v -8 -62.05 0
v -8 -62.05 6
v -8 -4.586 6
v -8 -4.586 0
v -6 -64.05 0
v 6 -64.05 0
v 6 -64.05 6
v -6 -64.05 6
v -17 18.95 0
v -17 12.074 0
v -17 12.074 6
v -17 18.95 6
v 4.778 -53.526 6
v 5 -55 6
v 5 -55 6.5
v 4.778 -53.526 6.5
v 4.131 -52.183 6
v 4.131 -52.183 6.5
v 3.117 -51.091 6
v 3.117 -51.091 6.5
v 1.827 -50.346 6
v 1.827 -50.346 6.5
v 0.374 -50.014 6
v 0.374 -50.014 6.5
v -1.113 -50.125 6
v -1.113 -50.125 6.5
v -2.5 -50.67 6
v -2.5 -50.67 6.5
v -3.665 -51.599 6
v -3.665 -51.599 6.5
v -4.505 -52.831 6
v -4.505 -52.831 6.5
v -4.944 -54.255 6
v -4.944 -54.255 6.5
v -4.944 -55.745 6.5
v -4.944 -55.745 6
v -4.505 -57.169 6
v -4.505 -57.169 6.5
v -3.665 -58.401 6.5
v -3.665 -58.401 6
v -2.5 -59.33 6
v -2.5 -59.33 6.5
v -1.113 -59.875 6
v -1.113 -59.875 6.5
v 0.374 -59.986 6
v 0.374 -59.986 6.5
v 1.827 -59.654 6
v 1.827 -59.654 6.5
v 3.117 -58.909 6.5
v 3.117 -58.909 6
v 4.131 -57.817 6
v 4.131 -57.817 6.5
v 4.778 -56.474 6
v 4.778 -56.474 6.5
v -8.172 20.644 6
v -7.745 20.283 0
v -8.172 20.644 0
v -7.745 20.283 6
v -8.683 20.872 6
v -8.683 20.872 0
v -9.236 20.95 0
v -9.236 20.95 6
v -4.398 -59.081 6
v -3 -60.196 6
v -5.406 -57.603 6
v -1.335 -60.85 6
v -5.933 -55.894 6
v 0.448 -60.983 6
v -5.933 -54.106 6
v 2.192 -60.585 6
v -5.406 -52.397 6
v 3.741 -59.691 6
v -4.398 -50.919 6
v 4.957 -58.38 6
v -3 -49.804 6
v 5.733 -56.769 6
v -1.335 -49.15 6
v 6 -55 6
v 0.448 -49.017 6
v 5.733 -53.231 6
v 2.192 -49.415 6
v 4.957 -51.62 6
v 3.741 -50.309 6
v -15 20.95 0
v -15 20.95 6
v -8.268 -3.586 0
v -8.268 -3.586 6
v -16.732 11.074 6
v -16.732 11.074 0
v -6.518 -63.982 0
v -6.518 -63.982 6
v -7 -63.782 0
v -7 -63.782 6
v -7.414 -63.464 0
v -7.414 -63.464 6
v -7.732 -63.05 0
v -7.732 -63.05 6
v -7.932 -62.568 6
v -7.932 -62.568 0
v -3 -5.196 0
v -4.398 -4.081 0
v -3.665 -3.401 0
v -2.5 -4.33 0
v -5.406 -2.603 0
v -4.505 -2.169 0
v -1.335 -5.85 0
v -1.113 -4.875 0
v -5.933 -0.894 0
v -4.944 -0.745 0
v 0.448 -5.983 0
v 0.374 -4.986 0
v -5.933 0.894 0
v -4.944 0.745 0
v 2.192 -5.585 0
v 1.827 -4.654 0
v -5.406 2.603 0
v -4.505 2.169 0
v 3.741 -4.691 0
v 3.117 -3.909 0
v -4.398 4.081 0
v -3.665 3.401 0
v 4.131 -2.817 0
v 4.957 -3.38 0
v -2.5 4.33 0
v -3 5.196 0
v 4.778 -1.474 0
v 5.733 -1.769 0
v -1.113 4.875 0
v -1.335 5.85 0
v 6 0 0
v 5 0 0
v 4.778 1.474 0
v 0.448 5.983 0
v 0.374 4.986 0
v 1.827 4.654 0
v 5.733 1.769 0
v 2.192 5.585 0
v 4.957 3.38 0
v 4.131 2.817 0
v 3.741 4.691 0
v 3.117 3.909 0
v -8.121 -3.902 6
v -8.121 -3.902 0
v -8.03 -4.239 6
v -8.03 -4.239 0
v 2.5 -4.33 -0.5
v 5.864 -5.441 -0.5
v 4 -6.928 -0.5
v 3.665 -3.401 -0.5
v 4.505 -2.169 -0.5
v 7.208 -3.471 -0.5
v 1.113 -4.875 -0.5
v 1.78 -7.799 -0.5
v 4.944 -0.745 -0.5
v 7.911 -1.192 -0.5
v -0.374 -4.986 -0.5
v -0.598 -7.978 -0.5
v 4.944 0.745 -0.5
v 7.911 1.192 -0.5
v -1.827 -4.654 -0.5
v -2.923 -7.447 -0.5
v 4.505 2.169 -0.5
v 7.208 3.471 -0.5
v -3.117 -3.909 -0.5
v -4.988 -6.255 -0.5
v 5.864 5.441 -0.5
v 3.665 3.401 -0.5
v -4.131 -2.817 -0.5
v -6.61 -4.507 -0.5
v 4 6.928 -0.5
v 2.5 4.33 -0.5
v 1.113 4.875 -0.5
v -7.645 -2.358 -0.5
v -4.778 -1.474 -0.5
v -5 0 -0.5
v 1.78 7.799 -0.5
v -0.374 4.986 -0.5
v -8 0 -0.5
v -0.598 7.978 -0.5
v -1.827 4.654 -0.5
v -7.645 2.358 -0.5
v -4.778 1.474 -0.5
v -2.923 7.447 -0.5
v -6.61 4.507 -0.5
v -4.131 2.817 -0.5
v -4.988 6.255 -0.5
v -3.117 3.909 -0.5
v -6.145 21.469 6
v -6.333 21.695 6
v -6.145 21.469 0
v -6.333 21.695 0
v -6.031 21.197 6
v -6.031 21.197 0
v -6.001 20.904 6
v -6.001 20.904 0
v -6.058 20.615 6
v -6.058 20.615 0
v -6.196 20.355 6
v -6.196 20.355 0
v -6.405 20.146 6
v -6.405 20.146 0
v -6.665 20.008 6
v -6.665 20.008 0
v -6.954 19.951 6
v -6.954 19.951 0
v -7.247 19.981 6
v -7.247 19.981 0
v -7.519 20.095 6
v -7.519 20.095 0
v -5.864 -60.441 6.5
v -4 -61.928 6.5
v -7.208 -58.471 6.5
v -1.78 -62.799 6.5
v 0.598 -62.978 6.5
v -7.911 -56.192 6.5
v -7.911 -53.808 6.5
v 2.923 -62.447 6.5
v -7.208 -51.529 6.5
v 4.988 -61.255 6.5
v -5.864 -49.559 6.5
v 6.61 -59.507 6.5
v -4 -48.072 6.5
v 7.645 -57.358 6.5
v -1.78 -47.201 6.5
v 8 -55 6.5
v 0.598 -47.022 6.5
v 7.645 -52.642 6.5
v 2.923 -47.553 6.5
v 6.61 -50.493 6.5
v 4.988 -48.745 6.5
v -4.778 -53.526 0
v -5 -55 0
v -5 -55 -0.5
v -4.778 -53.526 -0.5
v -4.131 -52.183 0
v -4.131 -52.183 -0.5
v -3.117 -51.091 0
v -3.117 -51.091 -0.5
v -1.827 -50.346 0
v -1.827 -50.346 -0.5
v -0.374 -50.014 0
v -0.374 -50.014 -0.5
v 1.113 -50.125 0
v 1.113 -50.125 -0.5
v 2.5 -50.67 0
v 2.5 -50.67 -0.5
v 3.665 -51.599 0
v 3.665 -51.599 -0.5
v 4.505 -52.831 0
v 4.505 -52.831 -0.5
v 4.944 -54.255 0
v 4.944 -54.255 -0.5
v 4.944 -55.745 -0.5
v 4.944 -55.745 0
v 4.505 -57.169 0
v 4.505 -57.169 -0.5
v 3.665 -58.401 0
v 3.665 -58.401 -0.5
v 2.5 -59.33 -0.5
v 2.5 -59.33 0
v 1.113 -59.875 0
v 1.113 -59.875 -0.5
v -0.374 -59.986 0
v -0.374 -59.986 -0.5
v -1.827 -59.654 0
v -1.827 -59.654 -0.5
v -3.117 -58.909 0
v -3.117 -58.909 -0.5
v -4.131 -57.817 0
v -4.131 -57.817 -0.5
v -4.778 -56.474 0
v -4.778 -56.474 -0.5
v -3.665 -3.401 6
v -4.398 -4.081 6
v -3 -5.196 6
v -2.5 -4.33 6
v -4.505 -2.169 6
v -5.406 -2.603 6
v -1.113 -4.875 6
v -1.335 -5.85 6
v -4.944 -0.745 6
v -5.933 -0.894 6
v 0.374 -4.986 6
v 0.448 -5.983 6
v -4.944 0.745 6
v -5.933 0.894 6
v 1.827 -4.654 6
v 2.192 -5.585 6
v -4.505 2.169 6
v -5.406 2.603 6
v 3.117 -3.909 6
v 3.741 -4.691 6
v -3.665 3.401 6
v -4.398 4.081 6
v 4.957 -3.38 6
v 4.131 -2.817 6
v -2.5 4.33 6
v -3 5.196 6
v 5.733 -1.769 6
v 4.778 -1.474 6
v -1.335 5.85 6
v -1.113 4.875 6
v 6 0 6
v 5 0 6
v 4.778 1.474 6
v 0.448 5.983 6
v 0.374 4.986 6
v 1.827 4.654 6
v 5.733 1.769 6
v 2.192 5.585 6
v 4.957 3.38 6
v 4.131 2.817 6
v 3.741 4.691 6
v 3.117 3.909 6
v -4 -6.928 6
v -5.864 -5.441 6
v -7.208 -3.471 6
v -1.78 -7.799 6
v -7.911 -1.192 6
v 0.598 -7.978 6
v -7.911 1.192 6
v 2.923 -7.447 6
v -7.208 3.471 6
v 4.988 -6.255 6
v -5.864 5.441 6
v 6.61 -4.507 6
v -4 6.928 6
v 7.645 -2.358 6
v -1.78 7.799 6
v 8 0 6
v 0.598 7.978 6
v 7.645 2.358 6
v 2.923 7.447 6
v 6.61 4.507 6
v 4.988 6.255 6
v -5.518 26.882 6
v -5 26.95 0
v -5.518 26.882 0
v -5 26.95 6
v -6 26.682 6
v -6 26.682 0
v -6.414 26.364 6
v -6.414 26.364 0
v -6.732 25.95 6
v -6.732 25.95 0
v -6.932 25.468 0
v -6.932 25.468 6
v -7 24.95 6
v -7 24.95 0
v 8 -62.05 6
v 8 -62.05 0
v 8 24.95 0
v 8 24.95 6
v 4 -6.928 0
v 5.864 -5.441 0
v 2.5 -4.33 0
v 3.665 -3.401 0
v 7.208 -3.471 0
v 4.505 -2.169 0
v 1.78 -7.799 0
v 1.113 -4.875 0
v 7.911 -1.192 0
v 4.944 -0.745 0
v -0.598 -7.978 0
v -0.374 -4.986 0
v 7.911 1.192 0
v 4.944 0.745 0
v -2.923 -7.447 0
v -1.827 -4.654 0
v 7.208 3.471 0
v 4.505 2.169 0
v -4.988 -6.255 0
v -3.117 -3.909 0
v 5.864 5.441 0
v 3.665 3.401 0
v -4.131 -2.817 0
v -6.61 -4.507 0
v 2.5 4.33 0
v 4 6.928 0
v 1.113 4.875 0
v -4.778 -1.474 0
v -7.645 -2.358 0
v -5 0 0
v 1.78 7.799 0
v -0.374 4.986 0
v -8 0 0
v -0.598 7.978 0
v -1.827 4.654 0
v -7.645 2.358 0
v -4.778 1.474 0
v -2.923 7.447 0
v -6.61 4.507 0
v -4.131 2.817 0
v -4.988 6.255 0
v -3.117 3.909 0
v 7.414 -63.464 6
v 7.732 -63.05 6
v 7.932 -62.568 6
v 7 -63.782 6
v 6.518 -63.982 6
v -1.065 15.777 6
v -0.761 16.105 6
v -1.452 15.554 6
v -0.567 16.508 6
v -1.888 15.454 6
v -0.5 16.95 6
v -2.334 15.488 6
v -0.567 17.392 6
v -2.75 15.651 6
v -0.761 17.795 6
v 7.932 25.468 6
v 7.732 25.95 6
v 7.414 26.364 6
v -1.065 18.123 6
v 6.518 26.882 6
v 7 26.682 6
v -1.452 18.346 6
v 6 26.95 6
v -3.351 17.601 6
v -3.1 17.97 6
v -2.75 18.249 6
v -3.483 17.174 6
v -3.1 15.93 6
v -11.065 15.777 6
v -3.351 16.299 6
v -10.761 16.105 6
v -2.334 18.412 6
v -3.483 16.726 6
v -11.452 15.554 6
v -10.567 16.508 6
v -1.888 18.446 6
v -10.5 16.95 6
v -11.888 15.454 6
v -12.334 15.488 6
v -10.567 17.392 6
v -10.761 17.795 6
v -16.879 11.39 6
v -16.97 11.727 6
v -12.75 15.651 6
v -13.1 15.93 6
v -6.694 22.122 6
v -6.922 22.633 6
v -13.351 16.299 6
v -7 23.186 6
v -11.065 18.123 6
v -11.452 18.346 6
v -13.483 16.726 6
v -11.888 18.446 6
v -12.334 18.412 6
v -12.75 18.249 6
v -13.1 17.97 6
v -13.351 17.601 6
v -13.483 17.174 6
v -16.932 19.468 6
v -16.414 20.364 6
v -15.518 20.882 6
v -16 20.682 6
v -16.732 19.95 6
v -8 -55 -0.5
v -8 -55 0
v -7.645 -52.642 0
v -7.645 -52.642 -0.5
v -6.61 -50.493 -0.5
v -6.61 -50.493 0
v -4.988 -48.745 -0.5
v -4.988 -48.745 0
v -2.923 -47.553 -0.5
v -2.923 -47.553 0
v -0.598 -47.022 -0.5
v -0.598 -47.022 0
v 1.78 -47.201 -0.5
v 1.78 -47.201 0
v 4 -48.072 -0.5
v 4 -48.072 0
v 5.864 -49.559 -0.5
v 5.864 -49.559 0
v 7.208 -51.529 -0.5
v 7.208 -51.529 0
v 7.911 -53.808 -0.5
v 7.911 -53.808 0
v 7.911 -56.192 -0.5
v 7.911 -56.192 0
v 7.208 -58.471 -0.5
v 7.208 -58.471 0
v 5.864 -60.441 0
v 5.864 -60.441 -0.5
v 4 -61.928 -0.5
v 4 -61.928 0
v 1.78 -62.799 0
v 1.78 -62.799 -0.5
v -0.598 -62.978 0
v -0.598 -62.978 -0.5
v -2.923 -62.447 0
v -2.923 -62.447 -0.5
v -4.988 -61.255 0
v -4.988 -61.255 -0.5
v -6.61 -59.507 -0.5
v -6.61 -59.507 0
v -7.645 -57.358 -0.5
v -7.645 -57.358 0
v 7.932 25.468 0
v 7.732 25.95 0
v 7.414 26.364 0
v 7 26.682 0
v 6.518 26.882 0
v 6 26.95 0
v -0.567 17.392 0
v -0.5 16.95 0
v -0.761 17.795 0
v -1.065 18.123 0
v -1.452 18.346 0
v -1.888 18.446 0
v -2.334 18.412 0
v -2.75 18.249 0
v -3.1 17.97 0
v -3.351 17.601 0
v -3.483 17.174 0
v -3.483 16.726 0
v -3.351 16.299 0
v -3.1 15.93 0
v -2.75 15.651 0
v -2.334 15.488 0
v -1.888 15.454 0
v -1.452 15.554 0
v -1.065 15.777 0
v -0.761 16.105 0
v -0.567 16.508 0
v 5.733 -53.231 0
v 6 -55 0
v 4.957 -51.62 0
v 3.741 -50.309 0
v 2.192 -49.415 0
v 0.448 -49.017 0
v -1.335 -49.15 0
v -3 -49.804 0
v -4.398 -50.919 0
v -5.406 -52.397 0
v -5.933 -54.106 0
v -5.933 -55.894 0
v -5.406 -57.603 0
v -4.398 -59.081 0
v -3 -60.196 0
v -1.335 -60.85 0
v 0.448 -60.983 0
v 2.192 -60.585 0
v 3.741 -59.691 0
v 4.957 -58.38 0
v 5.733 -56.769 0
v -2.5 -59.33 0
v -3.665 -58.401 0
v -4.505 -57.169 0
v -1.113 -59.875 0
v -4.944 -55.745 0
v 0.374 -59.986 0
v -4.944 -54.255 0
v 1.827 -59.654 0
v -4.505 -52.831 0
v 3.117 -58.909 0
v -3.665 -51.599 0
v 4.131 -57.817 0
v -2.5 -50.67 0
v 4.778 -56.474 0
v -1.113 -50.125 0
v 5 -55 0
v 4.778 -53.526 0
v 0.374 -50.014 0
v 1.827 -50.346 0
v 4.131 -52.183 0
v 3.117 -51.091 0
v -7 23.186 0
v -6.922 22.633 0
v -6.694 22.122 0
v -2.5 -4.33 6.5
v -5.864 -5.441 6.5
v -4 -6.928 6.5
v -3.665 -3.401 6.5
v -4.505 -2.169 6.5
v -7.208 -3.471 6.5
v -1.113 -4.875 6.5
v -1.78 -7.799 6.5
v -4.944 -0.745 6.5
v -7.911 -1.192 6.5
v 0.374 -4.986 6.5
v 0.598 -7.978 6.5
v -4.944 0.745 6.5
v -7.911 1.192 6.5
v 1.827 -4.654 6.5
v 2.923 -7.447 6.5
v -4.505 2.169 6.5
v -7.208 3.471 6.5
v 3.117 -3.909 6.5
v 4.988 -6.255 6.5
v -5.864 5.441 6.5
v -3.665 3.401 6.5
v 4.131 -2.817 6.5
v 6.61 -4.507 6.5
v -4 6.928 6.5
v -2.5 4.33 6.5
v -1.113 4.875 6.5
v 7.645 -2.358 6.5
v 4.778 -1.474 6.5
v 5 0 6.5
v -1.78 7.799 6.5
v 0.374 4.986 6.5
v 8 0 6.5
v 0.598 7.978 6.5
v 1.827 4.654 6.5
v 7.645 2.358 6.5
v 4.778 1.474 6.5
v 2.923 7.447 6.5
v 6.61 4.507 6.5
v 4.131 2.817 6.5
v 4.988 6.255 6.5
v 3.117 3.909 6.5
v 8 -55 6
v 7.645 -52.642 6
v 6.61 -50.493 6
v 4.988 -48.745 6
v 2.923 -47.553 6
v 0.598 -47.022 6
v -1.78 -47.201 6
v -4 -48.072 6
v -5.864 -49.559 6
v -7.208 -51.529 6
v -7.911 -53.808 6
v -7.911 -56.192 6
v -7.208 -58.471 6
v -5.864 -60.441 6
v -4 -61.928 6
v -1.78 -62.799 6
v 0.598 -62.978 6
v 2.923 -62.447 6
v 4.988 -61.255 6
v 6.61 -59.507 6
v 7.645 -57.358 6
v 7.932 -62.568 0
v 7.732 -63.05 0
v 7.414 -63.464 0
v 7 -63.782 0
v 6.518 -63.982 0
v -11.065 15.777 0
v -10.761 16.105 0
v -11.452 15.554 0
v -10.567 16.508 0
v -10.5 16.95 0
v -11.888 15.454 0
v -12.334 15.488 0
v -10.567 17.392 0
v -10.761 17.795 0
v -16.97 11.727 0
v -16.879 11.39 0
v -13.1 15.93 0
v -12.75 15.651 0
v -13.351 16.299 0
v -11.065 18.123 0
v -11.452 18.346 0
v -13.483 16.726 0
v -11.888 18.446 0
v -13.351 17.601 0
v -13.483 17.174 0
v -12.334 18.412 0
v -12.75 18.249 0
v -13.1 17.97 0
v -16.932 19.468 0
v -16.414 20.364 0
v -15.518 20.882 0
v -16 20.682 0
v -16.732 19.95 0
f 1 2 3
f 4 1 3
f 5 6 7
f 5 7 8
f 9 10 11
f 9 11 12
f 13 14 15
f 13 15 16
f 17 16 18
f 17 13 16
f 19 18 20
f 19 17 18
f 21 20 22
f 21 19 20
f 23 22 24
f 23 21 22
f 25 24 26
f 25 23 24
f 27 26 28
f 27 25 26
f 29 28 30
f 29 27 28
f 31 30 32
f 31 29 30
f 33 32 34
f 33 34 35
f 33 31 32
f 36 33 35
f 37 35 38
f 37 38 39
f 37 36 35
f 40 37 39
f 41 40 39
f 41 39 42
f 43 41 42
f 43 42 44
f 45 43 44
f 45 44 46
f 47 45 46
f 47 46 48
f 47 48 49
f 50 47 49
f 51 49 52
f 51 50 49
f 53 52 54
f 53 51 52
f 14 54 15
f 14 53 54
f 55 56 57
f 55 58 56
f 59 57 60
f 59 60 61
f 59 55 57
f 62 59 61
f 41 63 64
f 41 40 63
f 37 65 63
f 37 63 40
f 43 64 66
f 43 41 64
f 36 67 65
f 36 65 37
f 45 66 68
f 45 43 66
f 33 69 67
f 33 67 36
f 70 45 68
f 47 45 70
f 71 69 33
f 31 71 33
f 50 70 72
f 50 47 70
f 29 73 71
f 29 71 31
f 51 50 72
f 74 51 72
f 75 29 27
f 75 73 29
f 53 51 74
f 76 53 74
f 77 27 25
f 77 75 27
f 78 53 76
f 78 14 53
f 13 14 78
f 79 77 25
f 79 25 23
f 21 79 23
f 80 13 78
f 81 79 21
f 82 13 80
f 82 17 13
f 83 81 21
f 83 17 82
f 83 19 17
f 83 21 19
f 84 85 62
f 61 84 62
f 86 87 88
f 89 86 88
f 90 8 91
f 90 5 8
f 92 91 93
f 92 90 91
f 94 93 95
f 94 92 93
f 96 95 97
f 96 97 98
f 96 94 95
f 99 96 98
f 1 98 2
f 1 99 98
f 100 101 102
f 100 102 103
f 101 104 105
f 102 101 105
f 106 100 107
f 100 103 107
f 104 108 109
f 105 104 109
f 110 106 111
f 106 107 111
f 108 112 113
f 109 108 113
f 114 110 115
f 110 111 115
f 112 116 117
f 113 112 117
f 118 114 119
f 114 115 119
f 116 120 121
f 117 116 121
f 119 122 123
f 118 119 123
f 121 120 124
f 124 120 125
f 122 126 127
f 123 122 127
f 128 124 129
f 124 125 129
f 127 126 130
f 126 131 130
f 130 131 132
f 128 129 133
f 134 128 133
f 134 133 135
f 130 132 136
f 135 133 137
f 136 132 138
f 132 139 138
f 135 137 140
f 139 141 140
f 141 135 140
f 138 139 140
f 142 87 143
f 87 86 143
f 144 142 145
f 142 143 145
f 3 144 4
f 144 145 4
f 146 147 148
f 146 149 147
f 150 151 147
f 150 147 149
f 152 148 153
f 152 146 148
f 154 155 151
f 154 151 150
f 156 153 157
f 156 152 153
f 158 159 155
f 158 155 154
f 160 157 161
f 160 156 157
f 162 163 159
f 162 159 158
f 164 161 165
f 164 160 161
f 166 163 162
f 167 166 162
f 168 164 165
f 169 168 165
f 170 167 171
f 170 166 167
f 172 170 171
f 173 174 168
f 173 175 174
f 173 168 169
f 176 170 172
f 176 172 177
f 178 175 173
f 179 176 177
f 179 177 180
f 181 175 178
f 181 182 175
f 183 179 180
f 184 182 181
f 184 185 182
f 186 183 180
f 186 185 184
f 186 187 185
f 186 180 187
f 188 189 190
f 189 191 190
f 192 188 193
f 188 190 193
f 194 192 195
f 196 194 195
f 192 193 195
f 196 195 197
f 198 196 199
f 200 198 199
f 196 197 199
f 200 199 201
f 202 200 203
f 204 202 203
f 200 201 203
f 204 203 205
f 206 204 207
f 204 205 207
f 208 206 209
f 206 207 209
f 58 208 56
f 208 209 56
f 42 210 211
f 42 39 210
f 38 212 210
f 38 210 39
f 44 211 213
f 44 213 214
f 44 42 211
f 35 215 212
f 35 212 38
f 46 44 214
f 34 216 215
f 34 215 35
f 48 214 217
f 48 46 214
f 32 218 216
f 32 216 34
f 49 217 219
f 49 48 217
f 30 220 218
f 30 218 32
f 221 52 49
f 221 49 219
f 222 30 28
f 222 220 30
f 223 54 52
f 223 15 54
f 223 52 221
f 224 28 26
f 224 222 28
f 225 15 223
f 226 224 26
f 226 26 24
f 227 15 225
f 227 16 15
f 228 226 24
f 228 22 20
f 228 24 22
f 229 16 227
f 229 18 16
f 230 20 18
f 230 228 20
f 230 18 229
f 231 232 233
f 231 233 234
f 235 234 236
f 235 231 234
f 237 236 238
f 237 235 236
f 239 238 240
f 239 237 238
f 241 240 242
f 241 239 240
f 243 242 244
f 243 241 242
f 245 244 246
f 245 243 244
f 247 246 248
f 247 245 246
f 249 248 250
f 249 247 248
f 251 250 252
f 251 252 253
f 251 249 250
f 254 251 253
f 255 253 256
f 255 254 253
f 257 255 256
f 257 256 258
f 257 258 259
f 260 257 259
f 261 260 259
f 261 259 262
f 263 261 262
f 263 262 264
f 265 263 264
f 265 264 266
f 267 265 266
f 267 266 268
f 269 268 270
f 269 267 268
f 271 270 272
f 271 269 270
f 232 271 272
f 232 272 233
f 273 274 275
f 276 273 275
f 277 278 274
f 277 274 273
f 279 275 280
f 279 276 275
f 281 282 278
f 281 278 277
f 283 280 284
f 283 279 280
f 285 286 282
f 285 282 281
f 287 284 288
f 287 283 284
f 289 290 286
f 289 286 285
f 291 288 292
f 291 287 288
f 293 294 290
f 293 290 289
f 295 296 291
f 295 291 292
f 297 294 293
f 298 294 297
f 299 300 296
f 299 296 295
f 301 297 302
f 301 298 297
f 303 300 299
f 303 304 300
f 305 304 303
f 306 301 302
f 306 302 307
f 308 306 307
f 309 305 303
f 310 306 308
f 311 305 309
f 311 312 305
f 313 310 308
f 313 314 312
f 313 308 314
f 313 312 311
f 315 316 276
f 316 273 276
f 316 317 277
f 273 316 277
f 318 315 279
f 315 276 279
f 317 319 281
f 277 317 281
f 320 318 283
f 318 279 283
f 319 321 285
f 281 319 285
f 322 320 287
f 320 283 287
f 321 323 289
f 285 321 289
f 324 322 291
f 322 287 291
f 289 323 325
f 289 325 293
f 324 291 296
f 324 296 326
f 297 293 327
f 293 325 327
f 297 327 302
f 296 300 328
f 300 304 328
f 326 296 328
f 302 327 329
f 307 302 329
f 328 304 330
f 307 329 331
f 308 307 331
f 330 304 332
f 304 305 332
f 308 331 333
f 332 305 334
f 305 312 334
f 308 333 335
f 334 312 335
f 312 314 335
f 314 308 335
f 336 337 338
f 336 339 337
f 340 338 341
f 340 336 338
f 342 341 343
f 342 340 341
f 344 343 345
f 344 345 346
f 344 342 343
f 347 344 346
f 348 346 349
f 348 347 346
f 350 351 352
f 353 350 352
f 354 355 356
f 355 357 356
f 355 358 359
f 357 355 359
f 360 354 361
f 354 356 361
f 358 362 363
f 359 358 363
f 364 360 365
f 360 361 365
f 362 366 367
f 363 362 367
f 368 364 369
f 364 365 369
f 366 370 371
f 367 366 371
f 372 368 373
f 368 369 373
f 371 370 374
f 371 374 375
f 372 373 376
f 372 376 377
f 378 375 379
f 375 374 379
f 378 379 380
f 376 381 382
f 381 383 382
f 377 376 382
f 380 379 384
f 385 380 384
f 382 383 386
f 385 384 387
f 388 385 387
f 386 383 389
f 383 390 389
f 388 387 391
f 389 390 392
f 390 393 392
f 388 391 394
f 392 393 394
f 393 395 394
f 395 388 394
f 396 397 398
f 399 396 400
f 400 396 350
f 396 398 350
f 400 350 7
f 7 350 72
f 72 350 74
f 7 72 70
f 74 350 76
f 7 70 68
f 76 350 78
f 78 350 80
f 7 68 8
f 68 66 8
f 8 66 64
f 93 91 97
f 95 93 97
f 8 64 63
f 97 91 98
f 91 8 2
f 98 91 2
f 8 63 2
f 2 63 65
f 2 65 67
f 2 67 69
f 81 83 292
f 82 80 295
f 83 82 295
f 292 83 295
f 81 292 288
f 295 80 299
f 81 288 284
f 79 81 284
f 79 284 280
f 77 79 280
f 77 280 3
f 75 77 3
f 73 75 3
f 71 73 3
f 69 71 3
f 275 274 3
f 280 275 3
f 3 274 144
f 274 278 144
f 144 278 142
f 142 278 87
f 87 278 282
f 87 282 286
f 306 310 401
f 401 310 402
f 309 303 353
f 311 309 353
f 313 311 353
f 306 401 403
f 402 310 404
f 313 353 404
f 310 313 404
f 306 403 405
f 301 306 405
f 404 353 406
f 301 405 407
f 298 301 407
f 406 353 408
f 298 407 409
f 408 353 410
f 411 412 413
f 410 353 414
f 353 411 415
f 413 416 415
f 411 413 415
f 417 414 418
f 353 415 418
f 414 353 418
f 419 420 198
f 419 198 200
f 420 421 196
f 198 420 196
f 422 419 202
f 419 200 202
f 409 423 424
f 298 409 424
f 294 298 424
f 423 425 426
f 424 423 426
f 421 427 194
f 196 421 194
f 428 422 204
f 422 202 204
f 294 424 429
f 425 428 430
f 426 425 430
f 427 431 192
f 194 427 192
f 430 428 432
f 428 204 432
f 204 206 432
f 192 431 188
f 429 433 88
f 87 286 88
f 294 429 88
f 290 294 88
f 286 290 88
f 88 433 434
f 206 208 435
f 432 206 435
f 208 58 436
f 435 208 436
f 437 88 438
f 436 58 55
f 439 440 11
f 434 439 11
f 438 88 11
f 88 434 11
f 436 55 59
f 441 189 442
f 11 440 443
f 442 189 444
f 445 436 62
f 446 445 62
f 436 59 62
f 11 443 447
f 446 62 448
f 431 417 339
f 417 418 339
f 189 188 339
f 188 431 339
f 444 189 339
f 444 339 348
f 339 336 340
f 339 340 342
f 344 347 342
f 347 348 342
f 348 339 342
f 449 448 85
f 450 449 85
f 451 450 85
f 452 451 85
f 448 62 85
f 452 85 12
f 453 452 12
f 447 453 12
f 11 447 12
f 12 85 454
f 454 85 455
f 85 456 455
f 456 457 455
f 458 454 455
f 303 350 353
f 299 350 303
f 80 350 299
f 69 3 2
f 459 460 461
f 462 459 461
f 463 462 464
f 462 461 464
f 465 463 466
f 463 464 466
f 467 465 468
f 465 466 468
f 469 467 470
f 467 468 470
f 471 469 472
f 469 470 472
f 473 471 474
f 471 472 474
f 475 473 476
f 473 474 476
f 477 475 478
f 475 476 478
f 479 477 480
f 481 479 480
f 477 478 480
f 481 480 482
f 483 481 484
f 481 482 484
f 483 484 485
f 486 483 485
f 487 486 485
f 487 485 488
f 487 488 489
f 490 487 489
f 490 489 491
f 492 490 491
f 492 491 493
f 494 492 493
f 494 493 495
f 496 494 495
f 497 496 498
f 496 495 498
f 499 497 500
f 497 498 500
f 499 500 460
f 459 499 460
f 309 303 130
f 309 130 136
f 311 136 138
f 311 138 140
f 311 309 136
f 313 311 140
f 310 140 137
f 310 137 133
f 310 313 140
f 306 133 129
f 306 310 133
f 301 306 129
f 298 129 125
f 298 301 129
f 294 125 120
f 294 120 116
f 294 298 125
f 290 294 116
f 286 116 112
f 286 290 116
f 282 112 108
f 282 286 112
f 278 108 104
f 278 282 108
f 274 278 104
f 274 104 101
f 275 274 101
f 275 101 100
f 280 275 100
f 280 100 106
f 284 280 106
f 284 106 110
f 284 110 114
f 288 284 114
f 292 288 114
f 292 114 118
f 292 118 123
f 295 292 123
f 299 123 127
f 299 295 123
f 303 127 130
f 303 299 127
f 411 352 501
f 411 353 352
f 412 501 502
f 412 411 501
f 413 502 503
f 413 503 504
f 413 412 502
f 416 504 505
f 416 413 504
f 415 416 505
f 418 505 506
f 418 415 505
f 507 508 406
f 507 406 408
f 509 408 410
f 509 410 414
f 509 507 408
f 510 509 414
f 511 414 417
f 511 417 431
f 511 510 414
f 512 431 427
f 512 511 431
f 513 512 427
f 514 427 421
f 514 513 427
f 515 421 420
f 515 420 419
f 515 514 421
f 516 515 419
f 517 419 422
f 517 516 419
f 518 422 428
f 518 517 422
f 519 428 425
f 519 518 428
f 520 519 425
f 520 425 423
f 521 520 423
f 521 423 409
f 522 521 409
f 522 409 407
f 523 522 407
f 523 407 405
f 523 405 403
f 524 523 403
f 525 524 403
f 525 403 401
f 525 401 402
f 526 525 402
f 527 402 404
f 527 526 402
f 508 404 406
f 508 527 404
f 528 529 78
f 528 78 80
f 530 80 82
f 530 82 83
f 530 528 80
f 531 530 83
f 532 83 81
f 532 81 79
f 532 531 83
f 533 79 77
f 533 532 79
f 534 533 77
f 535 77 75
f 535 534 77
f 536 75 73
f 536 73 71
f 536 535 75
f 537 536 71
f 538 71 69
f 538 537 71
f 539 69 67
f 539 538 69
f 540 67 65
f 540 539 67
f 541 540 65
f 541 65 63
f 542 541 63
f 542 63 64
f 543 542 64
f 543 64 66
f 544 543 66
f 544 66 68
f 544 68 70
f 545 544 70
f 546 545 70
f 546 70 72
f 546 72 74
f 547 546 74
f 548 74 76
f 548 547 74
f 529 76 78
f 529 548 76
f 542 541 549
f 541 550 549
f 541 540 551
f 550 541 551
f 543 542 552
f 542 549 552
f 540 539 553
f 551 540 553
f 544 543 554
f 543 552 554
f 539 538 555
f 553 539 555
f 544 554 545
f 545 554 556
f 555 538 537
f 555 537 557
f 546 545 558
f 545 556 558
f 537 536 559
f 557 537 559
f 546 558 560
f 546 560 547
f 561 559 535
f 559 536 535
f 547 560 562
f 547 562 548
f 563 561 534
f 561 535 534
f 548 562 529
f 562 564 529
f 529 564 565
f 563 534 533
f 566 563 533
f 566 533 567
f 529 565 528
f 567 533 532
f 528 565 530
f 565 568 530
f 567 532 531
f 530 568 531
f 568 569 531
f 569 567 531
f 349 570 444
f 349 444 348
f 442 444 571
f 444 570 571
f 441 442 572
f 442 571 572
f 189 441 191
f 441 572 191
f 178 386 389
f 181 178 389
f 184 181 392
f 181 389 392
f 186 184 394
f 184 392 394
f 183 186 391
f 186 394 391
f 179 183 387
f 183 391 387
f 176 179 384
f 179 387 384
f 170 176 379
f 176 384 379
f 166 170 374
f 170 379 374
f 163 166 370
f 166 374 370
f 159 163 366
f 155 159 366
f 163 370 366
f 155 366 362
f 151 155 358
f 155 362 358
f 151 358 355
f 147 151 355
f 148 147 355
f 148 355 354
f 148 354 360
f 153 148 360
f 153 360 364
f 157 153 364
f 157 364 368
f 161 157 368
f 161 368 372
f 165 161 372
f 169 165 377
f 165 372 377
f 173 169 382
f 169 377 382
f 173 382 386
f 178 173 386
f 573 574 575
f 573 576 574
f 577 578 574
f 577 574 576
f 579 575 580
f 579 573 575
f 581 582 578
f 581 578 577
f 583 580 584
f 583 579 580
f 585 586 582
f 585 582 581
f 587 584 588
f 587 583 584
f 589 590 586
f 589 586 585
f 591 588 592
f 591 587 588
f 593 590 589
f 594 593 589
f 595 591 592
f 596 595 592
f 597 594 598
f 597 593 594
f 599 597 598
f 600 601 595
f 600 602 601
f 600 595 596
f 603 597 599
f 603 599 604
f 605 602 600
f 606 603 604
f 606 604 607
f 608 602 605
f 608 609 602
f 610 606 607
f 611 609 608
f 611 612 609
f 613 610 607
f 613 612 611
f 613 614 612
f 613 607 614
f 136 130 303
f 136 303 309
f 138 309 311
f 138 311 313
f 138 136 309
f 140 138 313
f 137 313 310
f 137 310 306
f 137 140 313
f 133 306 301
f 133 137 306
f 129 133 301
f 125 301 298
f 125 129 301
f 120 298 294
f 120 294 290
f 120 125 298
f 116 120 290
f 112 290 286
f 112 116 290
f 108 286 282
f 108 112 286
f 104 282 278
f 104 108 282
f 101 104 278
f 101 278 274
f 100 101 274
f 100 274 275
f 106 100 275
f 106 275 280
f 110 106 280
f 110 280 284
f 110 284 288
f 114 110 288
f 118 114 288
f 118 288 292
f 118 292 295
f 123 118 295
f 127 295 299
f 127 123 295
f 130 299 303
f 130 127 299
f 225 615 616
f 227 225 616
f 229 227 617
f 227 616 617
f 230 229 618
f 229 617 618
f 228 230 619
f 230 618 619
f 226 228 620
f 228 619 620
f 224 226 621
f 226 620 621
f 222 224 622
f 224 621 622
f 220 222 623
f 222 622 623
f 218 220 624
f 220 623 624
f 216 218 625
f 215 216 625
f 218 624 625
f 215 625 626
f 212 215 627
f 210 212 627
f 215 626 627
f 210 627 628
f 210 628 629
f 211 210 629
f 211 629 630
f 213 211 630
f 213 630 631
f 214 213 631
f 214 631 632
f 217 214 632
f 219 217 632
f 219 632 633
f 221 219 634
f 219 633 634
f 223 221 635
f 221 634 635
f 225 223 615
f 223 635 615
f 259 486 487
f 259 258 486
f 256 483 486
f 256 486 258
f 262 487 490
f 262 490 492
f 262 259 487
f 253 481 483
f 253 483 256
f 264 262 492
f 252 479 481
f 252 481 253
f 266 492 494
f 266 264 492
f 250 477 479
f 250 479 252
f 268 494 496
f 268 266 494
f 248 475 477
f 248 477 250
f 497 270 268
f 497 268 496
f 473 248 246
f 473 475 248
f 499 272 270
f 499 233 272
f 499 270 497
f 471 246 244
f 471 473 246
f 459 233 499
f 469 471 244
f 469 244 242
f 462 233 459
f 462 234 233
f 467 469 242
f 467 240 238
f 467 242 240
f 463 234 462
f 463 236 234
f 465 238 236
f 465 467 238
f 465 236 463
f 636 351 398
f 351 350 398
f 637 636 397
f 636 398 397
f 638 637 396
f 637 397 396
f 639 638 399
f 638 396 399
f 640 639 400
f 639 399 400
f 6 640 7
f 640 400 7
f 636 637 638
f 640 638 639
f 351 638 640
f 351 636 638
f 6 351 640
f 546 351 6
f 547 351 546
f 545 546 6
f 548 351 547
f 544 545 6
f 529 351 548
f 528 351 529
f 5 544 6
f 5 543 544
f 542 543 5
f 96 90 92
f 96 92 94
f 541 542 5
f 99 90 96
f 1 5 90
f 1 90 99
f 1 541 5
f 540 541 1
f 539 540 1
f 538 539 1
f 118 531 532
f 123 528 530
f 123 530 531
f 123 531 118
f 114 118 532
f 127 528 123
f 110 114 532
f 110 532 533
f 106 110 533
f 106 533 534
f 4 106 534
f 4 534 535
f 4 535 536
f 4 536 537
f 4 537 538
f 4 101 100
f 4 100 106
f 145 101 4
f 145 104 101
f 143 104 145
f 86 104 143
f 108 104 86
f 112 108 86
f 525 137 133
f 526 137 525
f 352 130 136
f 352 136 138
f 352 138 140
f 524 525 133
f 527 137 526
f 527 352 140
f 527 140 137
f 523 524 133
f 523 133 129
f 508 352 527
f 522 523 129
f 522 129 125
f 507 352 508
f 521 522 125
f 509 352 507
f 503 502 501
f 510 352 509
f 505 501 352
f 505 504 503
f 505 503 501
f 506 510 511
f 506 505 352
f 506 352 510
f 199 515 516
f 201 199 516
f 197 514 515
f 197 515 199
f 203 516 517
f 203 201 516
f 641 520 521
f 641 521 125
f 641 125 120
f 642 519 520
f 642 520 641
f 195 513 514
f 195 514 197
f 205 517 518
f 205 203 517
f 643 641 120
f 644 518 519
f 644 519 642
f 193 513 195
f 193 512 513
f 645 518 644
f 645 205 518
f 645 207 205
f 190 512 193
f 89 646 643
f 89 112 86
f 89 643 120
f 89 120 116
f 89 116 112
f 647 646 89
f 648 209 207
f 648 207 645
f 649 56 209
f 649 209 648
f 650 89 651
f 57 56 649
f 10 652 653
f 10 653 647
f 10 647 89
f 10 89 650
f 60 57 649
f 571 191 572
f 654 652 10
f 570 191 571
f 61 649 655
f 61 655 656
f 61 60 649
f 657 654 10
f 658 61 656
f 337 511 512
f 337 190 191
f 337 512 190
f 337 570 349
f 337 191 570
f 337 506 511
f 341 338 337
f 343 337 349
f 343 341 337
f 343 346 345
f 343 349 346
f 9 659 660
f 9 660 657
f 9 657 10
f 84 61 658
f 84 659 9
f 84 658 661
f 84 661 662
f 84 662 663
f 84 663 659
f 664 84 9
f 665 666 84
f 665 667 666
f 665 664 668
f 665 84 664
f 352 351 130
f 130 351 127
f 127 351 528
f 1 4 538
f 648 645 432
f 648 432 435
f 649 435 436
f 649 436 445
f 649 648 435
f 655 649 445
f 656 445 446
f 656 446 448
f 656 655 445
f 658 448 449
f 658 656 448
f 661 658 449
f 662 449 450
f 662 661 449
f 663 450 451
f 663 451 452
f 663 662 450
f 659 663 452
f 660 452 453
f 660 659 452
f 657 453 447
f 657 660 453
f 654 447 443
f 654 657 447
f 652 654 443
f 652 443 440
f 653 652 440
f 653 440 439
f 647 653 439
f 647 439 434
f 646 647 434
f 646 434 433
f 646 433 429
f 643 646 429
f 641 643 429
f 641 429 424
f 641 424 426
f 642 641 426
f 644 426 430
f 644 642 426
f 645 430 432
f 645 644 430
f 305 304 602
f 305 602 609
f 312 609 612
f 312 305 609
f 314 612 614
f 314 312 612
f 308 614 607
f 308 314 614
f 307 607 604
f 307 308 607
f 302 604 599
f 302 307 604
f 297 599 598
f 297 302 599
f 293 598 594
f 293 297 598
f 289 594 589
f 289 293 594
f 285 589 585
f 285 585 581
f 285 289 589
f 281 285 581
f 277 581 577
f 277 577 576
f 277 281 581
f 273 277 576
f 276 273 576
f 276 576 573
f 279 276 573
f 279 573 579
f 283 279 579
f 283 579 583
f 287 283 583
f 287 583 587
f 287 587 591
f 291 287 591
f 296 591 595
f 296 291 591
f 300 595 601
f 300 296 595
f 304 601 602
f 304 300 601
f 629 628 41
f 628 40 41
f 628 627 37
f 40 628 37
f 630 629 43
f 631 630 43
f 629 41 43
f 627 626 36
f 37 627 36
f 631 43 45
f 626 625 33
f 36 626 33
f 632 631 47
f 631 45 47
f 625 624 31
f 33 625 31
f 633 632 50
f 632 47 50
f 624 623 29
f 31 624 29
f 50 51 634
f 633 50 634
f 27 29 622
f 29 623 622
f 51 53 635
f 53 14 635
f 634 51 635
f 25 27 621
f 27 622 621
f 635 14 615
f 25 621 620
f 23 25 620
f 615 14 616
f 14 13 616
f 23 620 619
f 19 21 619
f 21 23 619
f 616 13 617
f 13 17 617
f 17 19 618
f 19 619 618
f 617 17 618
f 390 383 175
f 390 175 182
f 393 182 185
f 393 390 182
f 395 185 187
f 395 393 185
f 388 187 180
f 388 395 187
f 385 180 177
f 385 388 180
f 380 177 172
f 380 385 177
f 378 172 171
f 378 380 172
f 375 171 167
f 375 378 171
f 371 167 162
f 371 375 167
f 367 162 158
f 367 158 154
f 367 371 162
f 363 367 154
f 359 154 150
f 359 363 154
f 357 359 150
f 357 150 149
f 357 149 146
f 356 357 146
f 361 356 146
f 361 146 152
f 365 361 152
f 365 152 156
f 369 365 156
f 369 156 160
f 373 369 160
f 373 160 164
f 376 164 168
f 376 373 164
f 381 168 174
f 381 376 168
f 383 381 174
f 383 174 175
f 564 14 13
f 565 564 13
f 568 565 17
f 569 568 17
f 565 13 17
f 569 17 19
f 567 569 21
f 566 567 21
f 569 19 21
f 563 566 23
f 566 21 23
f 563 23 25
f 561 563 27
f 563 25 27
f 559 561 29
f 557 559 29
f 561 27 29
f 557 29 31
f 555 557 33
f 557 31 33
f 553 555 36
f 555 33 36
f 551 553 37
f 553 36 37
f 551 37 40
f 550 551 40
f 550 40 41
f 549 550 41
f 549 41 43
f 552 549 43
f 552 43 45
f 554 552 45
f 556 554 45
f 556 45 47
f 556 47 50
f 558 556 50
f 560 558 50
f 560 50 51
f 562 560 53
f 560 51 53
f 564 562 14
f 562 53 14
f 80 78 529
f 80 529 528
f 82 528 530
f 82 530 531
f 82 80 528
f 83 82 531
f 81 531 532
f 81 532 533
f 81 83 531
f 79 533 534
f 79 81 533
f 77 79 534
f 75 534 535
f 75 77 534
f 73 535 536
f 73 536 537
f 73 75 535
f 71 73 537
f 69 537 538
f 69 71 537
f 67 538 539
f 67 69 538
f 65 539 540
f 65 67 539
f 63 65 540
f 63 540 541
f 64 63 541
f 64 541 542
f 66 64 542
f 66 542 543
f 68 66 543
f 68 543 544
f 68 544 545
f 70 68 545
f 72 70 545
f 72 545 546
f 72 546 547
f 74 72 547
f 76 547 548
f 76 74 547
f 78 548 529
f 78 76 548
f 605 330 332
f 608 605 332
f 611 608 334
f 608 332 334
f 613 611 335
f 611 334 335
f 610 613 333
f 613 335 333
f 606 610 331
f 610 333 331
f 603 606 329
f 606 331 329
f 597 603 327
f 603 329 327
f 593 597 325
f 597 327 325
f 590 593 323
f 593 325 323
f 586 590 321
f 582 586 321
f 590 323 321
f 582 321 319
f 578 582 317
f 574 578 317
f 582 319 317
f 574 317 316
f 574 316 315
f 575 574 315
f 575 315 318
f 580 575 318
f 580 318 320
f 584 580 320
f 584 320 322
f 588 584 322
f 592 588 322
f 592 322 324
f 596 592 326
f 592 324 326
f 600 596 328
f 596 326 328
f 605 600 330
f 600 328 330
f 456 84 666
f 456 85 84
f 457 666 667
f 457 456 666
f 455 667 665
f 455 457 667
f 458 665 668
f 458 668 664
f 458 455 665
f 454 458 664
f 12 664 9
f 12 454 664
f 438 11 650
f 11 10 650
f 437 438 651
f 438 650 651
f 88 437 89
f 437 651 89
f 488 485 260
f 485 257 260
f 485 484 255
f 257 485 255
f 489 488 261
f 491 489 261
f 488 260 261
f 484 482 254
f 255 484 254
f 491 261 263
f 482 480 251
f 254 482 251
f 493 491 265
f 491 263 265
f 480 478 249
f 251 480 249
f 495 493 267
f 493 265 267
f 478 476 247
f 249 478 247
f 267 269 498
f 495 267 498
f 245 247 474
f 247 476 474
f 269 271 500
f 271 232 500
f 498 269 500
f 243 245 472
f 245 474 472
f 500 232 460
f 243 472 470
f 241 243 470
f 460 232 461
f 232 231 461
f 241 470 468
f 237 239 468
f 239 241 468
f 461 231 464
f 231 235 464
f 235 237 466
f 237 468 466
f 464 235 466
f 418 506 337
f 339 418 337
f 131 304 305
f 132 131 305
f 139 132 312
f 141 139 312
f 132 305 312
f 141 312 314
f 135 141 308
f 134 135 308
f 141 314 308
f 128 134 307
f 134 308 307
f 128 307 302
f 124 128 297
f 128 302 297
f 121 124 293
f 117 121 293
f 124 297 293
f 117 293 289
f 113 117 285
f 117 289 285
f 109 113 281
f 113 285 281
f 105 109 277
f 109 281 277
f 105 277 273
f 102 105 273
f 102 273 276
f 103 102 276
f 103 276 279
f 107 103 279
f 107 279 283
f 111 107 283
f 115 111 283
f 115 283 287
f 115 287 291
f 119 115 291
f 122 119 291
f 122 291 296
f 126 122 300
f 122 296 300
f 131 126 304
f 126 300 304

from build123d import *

# Parameters (mm, degrees)
SKETCH_1_R          = 6
SKETCH_1_R_2        = 1.5
EXTRUDE_1_DEPTH     = 6
SKETCH_2_R          = 6
SKETCH_2_R_2        = 5
EXTRUDE_2_DEPTH     = 6
EXTRUDE_2_2_DEPTH   = 6
SKETCH_3_R          = 8
SKETCH_3_R_2        = 5
EXTRUDE_3_DEPTH     = 0.5
EXTRUDE_3_2_DEPTH   = 0.5
SKETCH_4_R          = 8
SKETCH_4_R_2        = 5
EXTRUDE_4_DEPTH     = 0.5
EXTRUDE_4_2_DEPTH   = 0.5
SKETCH_5_W          = 15
SKETCH_5_H          = 6
EXTRUDE_5_DEPTH     = 6
SKETCH_6_R          = 1
CUT_EXTRUDE_1_DEPTH = 6
CUT_EXTRUDE_4_DEPTH = 6
FILLET_5_R          = 2


with BuildPart() as part:
    # 草图1 → 凸台-拉伸1 (new body)
    with BuildSketch(Plane.XY):
        Polygon((8, 20.95), (8, -64.05), (-12, -64.05), (-17, -35.693590902), (-17, 20.95), align=None)
        Circle(SKETCH_1_R, mode=Mode.SUBTRACT)
        with Locations((0, -55)):
            Circle(SKETCH_1_R, mode=Mode.SUBTRACT)
        with Locations((-2, 16.95)):
            Circle(SKETCH_1_R_2, mode=Mode.SUBTRACT)
        with Locations((-12, 16.95)):
            Circle(SKETCH_1_R_2, mode=Mode.SUBTRACT)
    extrude(amount=EXTRUDE_1_DEPTH)

    # 草图5 → 凸台-拉伸5 (add)
    with BuildSketch(Plane(origin=(0, 0, 0), x_dir=(-1, 0, 0), z_dir=(0, 0, -1))):
        with Locations((-0.5, 23.95)):
            Rectangle(SKETCH_5_W, SKETCH_5_H)
    extrude(amount=-EXTRUDE_5_DEPTH)

    # 草图6 → 切除-拉伸1 (cut)
    with BuildSketch(Plane(origin=(0, 0, 0), x_dir=(-1, 0, 0), z_dir=(0, 0, -1))):
        with Locations((7, 20.95)):
            Circle(SKETCH_6_R)
    extrude(amount=-CUT_EXTRUDE_1_DEPTH, mode=Mode.SUBTRACT)

    # 草图9 → 切除-拉伸4 (cut)
    with BuildSketch(Plane.XY.offset(6)):
        Polygon((-12, -64.05), (-8, -64.05), (-8, -4.05), (-17, 11.538457268), (-17, -35.693590902), align=None)
    extrude(amount=-CUT_EXTRUDE_4_DEPTH, mode=Mode.SUBTRACT)

    # 圆角5
    fillet_5_edges = [part.edges().sort_by_distance(p)[0] for p in [
        (8, 26.95, 3),
        (-7, 26.95, 3),
        (-7, 21.95, 3),
        (-8, 20.95, 3),
        (-8, -4.05, 3),
        (-8, -64.05, 3),
        (-17, 11.538457268, 3),
        (8, -64.05, 3),
        (-17, 20.95, 3),
    ]]
    fillet(fillet_5_edges, radius=FILLET_5_R)


with BuildPart() as body_2:
    # 草图2 → 凸台-拉伸2 (new body)
    with BuildSketch(Plane.XY.offset(6)):
        with Locations((0, -55)):
            Circle(SKETCH_2_R)
        with Locations((0, -55)):
            Circle(SKETCH_2_R_2, mode=Mode.SUBTRACT)
    extrude(amount=-EXTRUDE_2_DEPTH)


with BuildPart() as body_3:
    # 草图2 → Extrude 2 2 (new body)
    with BuildSketch(Plane.XY.offset(6)):
        Circle(SKETCH_2_R)
        Circle(SKETCH_2_R_2, mode=Mode.SUBTRACT)
    extrude(amount=-EXTRUDE_2_2_DEPTH)


with BuildPart() as body_4:
    # 草图3 → 凸台-拉伸3 (new body)
    with BuildSketch(Plane.XY.offset(6)):
        Circle(SKETCH_3_R)
        Circle(SKETCH_3_R_2, mode=Mode.SUBTRACT)
    extrude(amount=EXTRUDE_3_DEPTH)


with BuildPart() as body_5:
    # 草图3 → Extrude 3 2 (new body)
    with BuildSketch(Plane.XY.offset(6)):
        with Locations((0, -55)):
            Circle(SKETCH_3_R)
        with Locations((0, -55)):
            Circle(SKETCH_3_R_2, mode=Mode.SUBTRACT)
    extrude(amount=EXTRUDE_3_2_DEPTH)


with BuildPart() as body_6:
    # 草图4 → 凸台-拉伸4 (new body)
    with BuildSketch(Plane(origin=(0, 0, 0), x_dir=(-1, 0, 0), z_dir=(0, 0, -1))):
        with Locations((0, -55)):
            Circle(SKETCH_4_R)
        with Locations((0, -55)):
            Circle(SKETCH_4_R_2, mode=Mode.SUBTRACT)
    extrude(amount=EXTRUDE_4_DEPTH)


with BuildPart() as body_7:
    # 草图4 → Extrude 4 2 (new body)
    with BuildSketch(Plane(origin=(0, 0, 0), x_dir=(-1, 0, 0), z_dir=(0, 0, -1))):
        Circle(SKETCH_4_R)
        Circle(SKETCH_4_R_2, mode=Mode.SUBTRACT)
    extrude(amount=EXTRUDE_4_2_DEPTH)


solid = Compound([part.part, body_2.part, body_3.part, body_4.part, body_5.part, body_6.part, body_7.part])
